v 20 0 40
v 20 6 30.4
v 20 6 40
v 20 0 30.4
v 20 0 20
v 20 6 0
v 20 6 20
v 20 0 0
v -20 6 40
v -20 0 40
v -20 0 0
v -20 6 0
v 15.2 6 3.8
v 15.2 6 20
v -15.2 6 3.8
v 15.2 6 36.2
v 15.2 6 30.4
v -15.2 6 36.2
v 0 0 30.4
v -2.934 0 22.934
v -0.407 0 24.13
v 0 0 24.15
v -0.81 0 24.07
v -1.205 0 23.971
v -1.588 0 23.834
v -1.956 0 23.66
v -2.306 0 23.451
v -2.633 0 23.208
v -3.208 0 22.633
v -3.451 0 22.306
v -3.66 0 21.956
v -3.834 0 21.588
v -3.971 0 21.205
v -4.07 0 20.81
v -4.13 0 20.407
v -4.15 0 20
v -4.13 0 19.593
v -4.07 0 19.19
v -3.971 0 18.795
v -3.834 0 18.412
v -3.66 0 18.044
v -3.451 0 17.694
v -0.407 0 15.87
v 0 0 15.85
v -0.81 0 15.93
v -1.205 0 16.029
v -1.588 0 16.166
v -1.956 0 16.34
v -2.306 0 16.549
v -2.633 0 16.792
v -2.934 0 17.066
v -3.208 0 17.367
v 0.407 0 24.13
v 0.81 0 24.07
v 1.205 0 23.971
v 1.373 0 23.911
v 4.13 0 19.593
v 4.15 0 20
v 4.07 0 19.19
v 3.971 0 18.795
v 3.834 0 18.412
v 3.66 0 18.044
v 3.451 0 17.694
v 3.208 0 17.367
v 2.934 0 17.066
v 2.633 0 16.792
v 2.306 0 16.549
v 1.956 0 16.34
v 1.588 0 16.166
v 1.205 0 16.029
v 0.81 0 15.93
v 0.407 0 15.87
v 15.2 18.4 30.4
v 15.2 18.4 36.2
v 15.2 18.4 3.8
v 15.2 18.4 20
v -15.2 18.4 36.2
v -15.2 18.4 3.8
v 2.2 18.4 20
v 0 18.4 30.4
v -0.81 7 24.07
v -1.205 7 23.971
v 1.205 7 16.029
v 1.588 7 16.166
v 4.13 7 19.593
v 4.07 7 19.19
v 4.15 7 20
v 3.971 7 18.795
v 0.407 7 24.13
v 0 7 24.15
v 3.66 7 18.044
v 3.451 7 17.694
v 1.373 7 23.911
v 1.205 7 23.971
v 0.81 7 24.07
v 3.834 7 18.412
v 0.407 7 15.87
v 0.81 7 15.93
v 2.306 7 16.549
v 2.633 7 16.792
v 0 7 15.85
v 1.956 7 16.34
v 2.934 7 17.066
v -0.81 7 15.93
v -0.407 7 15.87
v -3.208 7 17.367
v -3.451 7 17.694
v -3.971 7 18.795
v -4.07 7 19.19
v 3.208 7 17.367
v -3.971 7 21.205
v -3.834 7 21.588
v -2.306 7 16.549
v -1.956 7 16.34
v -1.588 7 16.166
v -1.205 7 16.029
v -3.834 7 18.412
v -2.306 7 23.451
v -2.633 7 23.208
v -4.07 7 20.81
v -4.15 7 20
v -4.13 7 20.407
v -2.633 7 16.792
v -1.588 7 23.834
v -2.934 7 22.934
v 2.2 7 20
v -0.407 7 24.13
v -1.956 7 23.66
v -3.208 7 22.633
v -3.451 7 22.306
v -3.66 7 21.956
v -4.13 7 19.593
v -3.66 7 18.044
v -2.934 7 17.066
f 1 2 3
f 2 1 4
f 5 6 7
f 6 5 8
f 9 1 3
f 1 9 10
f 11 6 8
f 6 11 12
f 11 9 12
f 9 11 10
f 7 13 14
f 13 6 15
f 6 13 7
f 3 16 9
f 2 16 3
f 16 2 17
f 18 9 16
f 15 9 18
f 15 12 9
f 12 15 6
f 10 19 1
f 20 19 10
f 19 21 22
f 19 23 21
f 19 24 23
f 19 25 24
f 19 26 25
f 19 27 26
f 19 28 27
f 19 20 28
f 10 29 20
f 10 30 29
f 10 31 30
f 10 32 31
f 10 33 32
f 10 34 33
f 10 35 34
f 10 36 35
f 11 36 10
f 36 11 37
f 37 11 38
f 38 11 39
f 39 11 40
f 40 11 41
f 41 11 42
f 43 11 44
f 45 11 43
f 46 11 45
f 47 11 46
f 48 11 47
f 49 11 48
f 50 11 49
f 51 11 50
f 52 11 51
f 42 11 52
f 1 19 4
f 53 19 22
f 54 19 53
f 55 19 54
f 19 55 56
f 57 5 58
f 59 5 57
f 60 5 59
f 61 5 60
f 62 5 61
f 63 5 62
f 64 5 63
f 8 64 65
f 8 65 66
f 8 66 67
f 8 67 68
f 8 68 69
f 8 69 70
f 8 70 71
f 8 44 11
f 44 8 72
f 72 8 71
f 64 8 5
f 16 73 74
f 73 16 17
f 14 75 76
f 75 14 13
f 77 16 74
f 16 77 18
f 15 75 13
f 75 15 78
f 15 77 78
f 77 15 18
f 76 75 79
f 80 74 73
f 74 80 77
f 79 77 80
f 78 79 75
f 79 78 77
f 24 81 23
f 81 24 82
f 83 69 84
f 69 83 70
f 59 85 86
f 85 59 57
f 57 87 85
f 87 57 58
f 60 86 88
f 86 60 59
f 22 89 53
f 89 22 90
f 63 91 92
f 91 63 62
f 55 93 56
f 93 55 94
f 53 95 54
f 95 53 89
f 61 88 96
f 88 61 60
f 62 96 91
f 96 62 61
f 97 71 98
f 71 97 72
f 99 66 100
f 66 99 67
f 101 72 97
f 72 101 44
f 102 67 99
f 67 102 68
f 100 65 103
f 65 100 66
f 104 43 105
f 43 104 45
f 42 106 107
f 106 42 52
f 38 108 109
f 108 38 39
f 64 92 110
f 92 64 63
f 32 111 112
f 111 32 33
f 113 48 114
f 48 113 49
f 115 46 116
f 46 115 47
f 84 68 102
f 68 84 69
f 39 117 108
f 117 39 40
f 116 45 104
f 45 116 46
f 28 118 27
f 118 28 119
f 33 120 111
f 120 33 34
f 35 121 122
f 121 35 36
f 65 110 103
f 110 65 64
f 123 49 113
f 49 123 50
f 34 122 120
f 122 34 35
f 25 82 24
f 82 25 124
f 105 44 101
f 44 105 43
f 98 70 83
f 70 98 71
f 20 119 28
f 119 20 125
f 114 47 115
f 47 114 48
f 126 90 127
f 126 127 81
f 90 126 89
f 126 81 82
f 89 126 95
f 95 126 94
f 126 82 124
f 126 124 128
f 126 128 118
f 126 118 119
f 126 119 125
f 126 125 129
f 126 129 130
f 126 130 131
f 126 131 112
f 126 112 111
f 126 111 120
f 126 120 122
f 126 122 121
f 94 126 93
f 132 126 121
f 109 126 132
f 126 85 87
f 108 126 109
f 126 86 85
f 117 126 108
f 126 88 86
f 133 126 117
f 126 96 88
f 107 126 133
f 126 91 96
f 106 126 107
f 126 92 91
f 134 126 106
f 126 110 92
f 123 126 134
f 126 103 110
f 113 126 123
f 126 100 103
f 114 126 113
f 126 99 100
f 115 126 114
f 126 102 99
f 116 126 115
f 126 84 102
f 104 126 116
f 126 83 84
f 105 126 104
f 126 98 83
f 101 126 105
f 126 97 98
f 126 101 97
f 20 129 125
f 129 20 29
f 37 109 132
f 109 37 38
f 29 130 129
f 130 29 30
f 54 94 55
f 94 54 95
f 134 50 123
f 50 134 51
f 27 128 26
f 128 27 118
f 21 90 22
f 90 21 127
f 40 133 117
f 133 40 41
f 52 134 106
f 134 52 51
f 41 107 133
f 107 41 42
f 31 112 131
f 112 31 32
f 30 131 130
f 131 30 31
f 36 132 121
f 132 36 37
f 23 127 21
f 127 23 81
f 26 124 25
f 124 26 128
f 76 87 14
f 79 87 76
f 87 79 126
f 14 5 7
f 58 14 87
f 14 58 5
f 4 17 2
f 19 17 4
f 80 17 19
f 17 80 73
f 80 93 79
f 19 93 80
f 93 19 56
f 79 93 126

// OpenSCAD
// Optional adapter: dovetail receiver -> 4040 / 4080 aluminum profile (M8)
// Broadens the product line beyond tubular Evolve-style frames.

profile_slot    = 8.2;   // T-slot opening
plate_w         = 40;
plate_h         = 40;
plate_t         = 6;
hole_d          = 8.3;   // M8 clearance
dovetail_w      = 22.4;
dovetail_h      = 10.4;
dovetail_len    = 28.4;
$fn = 64;

difference() {
    union() {
        // profile face plate
        translate([-plate_w/2, 0, 0])
            cube([plate_w, plate_t, plate_h]);
        // dovetail block
        translate([0, plate_t + dovetail_h/2, plate_h/2])
            cube([dovetail_w + 8, dovetail_h + 4, dovetail_len + 4], center = true);
    }
    // M8 center hole
    translate([0, -1, plate_h/2])
        rotate([-90, 0, 0])
            cylinder(h = plate_t + 2, r = hole_d/2);
    // female dovetail
    translate([0, plate_t + 1, plate_h/2])
        rotate([90, 0, 0])
            linear_extrude(height = dovetail_len + 1, center = true)
                polygon([
                    [2.2, 0],
                    [dovetail_w - 2.2, 0],
                    [dovetail_w, dovetail_h],
                    [0, dovetail_h]
                ]);
}
